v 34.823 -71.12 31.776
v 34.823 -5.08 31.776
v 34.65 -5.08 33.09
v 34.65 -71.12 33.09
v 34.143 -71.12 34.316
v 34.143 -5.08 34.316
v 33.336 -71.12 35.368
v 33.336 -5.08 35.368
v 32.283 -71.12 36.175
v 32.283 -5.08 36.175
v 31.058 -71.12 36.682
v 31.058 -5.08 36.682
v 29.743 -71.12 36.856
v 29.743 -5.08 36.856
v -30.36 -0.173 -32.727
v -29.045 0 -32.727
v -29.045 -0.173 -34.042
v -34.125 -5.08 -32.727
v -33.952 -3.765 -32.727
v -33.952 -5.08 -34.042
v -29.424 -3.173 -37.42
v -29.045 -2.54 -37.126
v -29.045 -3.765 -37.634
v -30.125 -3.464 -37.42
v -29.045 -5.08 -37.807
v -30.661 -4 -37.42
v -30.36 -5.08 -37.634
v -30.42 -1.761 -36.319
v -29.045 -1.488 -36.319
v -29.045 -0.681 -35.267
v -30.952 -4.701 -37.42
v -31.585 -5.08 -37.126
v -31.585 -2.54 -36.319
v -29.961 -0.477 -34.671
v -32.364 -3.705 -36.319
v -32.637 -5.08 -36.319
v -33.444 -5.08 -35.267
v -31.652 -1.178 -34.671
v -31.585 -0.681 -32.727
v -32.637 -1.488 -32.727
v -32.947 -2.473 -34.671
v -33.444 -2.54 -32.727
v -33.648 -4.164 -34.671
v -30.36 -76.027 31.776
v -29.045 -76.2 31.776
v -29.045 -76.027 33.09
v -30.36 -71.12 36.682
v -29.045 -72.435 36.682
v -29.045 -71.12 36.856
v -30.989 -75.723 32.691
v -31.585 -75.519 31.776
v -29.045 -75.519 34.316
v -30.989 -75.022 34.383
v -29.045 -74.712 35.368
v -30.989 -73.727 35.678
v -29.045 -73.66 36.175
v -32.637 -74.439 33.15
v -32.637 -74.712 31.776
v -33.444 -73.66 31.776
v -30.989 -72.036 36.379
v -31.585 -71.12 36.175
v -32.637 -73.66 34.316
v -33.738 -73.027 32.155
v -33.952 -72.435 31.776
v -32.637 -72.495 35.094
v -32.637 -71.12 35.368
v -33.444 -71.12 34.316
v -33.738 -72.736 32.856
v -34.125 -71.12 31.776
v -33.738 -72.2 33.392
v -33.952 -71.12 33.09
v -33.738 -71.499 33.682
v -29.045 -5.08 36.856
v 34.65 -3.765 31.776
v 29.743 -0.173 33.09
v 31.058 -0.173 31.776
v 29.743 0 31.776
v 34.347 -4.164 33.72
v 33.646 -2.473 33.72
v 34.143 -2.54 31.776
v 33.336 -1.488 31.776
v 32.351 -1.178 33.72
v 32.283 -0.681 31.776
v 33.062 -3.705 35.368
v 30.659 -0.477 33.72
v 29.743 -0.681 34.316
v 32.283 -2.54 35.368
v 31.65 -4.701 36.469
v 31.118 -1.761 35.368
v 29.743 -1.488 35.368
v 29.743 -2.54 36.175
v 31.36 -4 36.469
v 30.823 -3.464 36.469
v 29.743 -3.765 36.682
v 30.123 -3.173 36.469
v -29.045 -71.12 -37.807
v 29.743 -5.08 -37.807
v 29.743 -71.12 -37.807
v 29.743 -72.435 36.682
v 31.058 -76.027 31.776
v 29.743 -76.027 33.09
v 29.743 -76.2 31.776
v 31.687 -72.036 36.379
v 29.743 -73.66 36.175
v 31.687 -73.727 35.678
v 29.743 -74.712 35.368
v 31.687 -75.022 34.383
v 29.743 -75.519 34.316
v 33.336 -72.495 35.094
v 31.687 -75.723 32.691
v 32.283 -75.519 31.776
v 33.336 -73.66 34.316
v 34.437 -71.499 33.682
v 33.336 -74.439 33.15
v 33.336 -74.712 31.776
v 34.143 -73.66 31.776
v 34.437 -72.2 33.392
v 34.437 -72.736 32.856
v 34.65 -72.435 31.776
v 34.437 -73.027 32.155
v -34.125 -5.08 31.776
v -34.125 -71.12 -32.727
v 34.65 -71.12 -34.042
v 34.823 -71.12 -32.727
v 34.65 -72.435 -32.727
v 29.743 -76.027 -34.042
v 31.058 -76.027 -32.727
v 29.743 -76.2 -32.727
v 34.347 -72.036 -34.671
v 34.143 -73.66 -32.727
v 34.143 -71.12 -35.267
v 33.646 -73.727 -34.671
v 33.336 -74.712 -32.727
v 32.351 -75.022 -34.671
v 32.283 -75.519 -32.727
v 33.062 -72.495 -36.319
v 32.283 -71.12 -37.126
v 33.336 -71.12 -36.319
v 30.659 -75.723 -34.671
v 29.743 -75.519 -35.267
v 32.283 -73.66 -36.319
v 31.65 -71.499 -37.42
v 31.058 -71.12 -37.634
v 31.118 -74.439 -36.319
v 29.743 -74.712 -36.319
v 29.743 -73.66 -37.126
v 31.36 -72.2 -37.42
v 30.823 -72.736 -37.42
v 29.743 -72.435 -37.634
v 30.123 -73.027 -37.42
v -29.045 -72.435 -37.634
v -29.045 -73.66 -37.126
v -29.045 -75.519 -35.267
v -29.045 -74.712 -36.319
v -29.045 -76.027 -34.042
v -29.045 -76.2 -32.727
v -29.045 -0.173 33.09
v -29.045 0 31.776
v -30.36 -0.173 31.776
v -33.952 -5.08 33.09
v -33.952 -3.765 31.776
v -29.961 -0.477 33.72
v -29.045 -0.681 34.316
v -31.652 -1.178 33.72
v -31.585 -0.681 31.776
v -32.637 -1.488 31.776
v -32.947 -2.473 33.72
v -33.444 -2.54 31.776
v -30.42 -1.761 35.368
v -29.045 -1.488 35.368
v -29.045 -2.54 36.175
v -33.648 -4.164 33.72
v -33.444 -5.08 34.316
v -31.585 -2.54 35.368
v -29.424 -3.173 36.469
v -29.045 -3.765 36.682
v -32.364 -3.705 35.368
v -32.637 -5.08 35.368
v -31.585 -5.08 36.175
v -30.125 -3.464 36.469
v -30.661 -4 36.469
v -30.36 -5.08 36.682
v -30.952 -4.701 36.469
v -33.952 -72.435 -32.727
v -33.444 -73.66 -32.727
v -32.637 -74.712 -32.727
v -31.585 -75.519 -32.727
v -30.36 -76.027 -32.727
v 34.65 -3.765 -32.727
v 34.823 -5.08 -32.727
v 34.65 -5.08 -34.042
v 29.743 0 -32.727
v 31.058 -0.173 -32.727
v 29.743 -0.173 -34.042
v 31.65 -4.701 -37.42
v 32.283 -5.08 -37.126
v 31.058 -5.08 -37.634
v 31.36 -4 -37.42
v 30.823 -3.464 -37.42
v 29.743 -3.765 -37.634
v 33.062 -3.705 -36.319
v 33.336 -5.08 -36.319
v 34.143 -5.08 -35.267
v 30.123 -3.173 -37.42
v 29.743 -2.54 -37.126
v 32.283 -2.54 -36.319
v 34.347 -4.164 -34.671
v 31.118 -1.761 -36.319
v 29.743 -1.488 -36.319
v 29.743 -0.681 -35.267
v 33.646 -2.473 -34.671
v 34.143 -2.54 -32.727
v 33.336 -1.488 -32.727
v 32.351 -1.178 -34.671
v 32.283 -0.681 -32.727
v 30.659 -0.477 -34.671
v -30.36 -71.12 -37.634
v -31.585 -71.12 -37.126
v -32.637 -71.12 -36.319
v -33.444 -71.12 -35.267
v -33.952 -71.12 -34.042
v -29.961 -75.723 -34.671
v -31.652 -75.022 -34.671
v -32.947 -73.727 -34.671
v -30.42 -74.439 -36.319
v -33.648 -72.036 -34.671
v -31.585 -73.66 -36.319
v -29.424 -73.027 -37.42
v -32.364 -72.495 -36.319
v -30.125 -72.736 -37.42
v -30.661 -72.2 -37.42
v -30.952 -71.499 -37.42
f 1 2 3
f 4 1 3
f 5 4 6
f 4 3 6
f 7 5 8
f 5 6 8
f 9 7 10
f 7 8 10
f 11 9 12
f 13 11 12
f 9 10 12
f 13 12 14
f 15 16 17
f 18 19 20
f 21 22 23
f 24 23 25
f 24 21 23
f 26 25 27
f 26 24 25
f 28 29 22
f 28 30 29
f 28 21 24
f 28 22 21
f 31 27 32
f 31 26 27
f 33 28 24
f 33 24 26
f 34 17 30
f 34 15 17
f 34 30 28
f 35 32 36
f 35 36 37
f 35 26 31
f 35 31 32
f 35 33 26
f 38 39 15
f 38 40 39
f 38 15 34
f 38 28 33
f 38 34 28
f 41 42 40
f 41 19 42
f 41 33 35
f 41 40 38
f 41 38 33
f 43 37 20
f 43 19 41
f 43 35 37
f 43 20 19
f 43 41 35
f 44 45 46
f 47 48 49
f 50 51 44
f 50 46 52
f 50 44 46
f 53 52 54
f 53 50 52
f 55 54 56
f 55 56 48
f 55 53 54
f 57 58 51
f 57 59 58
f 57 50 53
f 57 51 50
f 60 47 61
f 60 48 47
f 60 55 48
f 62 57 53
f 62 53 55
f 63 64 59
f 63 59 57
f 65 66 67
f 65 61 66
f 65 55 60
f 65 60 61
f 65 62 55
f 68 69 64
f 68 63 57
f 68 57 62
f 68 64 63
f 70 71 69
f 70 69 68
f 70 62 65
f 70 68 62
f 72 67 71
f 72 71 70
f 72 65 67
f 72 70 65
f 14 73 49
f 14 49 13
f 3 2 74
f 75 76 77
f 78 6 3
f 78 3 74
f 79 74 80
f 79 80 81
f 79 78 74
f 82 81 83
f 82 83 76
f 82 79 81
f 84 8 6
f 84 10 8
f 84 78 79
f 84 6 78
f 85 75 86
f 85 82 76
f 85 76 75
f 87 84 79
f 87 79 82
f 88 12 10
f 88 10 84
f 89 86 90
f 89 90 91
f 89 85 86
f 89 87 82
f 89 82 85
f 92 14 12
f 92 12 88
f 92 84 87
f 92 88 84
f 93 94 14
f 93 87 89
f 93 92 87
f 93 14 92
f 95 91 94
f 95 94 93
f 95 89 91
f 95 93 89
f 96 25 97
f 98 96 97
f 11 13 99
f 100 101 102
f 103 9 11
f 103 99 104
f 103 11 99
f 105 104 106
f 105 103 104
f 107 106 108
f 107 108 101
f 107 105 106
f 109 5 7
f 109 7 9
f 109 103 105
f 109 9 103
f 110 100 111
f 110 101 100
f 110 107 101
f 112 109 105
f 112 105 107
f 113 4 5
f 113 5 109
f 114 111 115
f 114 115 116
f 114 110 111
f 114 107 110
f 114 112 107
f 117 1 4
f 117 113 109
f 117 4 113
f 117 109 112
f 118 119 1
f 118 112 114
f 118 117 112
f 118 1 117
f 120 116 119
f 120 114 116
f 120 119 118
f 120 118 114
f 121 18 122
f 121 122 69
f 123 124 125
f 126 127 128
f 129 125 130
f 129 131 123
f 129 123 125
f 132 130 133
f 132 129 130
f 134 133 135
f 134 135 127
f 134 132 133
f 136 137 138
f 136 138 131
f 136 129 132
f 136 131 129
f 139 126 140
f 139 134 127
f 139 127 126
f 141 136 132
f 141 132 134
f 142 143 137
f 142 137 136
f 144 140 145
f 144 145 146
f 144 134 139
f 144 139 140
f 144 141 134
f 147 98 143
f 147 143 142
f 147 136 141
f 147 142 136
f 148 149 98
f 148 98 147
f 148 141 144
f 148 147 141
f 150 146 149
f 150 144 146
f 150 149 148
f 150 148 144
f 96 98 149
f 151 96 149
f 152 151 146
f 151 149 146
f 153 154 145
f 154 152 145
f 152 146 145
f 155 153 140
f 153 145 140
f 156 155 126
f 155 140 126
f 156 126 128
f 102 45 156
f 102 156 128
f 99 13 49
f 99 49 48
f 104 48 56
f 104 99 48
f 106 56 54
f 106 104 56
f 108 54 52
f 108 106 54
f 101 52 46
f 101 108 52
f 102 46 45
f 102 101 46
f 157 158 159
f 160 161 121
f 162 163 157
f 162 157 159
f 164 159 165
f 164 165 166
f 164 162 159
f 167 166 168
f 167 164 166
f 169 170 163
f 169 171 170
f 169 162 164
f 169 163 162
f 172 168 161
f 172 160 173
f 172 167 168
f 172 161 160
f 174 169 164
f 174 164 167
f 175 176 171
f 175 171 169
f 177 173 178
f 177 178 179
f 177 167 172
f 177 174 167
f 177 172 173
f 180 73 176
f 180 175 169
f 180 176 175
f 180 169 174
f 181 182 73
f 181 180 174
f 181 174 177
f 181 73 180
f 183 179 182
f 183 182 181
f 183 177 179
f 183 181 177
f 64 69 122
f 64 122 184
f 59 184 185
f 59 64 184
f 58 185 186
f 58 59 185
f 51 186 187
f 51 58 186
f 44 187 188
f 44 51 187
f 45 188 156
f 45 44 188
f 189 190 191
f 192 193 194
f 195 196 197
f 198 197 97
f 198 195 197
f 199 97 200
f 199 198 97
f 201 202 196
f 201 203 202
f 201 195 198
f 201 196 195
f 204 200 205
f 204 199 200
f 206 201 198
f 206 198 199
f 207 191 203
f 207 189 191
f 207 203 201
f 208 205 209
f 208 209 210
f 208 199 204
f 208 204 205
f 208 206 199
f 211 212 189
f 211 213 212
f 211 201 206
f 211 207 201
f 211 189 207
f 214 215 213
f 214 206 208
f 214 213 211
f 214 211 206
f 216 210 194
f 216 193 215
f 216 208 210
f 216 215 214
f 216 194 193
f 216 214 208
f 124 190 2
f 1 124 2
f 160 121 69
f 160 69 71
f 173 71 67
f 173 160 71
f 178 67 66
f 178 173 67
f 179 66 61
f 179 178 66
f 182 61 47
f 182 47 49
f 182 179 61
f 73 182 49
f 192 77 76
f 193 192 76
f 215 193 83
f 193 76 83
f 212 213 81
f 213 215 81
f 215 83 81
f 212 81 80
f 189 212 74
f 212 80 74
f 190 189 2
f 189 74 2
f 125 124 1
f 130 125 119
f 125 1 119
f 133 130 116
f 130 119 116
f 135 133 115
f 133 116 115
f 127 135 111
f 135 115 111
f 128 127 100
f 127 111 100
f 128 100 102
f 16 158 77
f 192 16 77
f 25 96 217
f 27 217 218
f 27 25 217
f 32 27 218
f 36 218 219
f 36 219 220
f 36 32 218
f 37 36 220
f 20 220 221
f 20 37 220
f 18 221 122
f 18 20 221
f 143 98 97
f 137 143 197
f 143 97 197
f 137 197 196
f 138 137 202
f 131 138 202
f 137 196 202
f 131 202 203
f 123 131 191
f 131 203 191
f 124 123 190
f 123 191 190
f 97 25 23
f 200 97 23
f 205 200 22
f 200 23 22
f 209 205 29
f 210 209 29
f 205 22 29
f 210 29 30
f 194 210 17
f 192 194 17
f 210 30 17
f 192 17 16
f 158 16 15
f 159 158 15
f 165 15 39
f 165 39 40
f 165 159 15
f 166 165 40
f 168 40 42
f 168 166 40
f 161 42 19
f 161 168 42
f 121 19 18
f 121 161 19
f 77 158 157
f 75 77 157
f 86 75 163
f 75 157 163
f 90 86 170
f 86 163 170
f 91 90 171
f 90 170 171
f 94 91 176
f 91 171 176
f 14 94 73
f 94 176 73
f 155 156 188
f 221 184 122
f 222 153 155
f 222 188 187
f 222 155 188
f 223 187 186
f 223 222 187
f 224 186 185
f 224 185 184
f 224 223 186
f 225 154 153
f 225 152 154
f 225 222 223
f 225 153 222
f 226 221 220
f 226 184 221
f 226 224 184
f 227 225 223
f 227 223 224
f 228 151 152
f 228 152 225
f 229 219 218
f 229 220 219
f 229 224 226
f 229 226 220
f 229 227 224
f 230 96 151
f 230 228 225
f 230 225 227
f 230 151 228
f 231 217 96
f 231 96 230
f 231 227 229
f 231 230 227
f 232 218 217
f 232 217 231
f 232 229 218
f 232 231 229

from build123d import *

# Parameters (mm, degrees)
F0_W         = 68.9483396709
F0_H         = 74.6622905135
F1_DEPTH     = 76.2
F2_R         = 5.08
F3_R         = 5.08
F4_R         = 5.08
F5_T1_DEPTH  = 66.04
F5_T3_DEPTH  = 58.7883396709
F5_S7_W      = 5.08
F5_S7_H      = 5.08
F5_T8_DEPTH  = 5.08
F5_S13_W     = 5.08
F5_S13_H     = 5.08
F5_T14_DEPTH = 5.08
F5_T18_ANGLE = 90
F5_T20_ANGLE = 90
F6_T1_DEPTH  = 58.7883396709
F6_T3_DEPTH  = 66.04
F6_S7_W      = 5.08
F6_S7_H      = 5.08
F6_T8_DEPTH  = 5.08
F6_S13_W     = 5.08
F6_S13_H     = 5.08
F6_T14_DEPTH = 5.08
F6_T18_ANGLE = 90
F6_T20_ANGLE = 90


# Not quite as in the source:
# - a fillet or chamfer that OpenCascade refuses, or shapes differently, is made with other operations: its cross-section is extruded or revolved along the edge and cut away or added


with BuildPart() as f1:
    # F0 (on Front) → F1 (new body)
    with BuildSketch(Plane.XZ):
        with Locations((0.3492366523, -0.4755854607)):
            Rectangle(F0_W, F0_H)
    extrude(amount=F1_DEPTH)

    # F2
    f2_edges = [f1.edges().sort_by_distance(p)[0] for p in [
        (34.823406, -76.2, -0.475585),
        (0.349237, -76.2, 36.85556),
        (-34.124933, -76.2, -0.475585),
        (0.349237, -76.2, -37.806731),
    ]]
    fillet(f2_edges, radius=F2_R)

    # F3
    f3_edges = [f1.edges().sort_by_distance(p)[0] for p in [
        (34.823406, 0, -0.475585),
    ]]
    fillet(f3_edges, radius=F3_R)

    # F4
    f4_edges = [f1.edges().sort_by_distance(p)[0] for p in [
        (-34.124933, 0, -0.475585),
    ]]
    fillet(f4_edges, radius=F4_R)

    # F5: fillet of radius 5.08 on 1 edges, made by hand

    # F5_s2 → F5_t1 (cut)
    with BuildSketch(Plane.XZ.offset(5.08)):
        with BuildLine():
            ThreePointArc((34.8234064877, 31.7755597961), (33.3355089361, 35.3676622445), (29.7434064877, 36.8555597961))
            Line((29.7434064877, 36.8555597961), (34.8234064877, 36.8555597961))
            Line((34.8234064877, 36.8555597961), (34.8234064877, 31.7755597961))
        make_face()
        with BuildLine():
            ThreePointArc((-34.1249331832, 31.7755597961), (-32.6370356316, 35.3676622445), (-29.0449331832, 36.8555597961))
            Line((-29.0449331832, 36.8555597961), (-34.1249331832, 36.8555597961))
            Line((-34.1249331832, 36.8555597961), (-34.1249331832, 31.7755597961))
        make_face()
    extrude(amount=F5_T1_DEPTH, mode=Mode.SUBTRACT)

    # F5_s4 → F5_t3 (cut)
    with BuildSketch(Plane.YZ.offset(-29.0449331832)):
        with BuildLine():
            ThreePointArc((0, 31.7755597961), (-1.4878975516, 35.3676622445), (-5.08, 36.8555597961))
            Line((-5.08, 36.8555597961), (0, 36.8555597961))
            Line((0, 36.8555597961), (0, 31.7755597961))
        make_face()
    extrude(amount=F5_T3_DEPTH, mode=Mode.SUBTRACT)


with BuildPart() as f5_tool6:
    # F5_s7 → F5_t8 (new body)
    with BuildSketch(Plane.YZ.offset(29.7434064877)):
        with Locations((-73.66, 34.3155597961)):
            Rectangle(F5_S7_W, F5_S7_H)
    extrude(amount=F5_T8_DEPTH)

    # F5_s9 → F5_t10 (revolve, cut)
    with BuildSketch(Plane(origin=(29.7434064877, -71.12, 31.7755597961), x_dir=(0, 0.7071067812, -0.7071067812), z_dir=(0, -0.7071067812, -0.7071067812))):
        with BuildLine():
            ThreePointArc((0, -5.08), (5.08, 0), (0, 5.08))
            Line((0, 5.08), (0, -5.08))
        make_face()
    revolve(axis=Axis((29.7434064877, -71.12, 31.7755597961), (1, 0, 0)), mode=Mode.SUBTRACT)


with BuildPart() as f1_1:
    add(f1.part)

    # F5_t5: cut F5_tool6
    add(f5_tool6.part, mode=Mode.SUBTRACT)


with BuildPart() as f5_tool12:
    # F5_s13 → F5_t14 (new body)
    with BuildSketch(Plane.YZ.offset(-29.0449331832)):
        with Locations((-73.66, 34.3155597961)):
            Rectangle(F5_S13_W, F5_S13_H)
    extrude(amount=-F5_T14_DEPTH)

    # F5_s15 → F5_t16 (revolve, cut)
    with BuildSketch(Plane(origin=(-29.0449331832, -71.12, 31.7755597961), x_dir=(0, 0.7071067812, -0.7071067812), z_dir=(0, 0.7071067812, 0.7071067812))):
        with BuildLine():
            ThreePointArc((0, -5.08), (5.08, 0), (0, 5.08))
            Line((0, 5.08), (0, -5.08))
        make_face()
    revolve(axis=Axis((-29.0449331832, -71.12, 31.7755597961), (-1, 0, 0)), mode=Mode.SUBTRACT)


with BuildPart() as f1_2:
    add(f1_1.part)

    # F5_t11: cut F5_tool12
    add(f5_tool12.part, mode=Mode.SUBTRACT)

    # F5_s17 → F5_t18 (revolve, cut)
    with BuildSketch(Plane.XZ.offset(5.08)):
        with BuildLine():
            ThreePointArc((34.8234064877, 31.7755597961), (33.3355089361, 35.3676622445), (29.7434064877, 36.8555597961))
            Line((29.7434064877, 36.8555597961), (34.8234064877, 36.8555597961))
            Line((34.8234064877, 36.8555597961), (34.8234064877, 31.7755597961))
        make_face()
    revolve(axis=Axis((29.7434064877, -5.08, 36.8555597961), (0, 0, 1)), revolution_arc=F5_T18_ANGLE, mode=Mode.SUBTRACT)

    # F5_s19 → F5_t20 (revolve, cut)
    with BuildSketch(Plane.YZ.offset(-29.0449331832)):
        with BuildLine():
            ThreePointArc((0, 31.7755597961), (-1.4878975516, 35.3676622445), (-5.08, 36.8555597961))
            Line((-5.08, 36.8555597961), (0, 36.8555597961))
            Line((0, 36.8555597961), (0, 31.7755597961))
        make_face()
    revolve(axis=Axis((-29.0449331832, -5.08, 36.8555597961), (0, 0, 1)), revolution_arc=F5_T20_ANGLE, mode=Mode.SUBTRACT)

    # F6: fillet of radius 5.08 on 1 edges, made by hand

    # F6_s2 → F6_t1 (cut)
    with BuildSketch(Plane.YZ.offset(-29.0449331832)):
        with BuildLine():
            ThreePointArc((-5.08, -37.8067307174), (-1.4878975516, -36.3188331658), (0, -32.7267307174))
            Line((0, -32.7267307174), (0, -37.8067307174))
            Line((0, -37.8067307174), (-5.08, -37.8067307174))
        make_face()
    extrude(amount=F6_T1_DEPTH, mode=Mode.SUBTRACT)

    # F6_s4 → F6_t3 (cut)
    with BuildSketch(Plane.XZ.offset(5.08)):
        with BuildLine():
            ThreePointArc((29.7434064877, -37.8067307174), (33.3355089361, -36.3188331658), (34.8234064877, -32.7267307174))
            Line((34.8234064877, -32.7267307174), (34.8234064877, -37.8067307174))
            Line((34.8234064877, -37.8067307174), (29.7434064877, -37.8067307174))
        make_face()
        with BuildLine():
            ThreePointArc((-29.0449331832, -37.8067307174), (-32.6370356316, -36.3188331658), (-34.1249331832, -32.7267307174))
            Line((-34.1249331832, -32.7267307174), (-34.1249331832, -37.8067307174))
            Line((-34.1249331832, -37.8067307174), (-29.0449331832, -37.8067307174))
        make_face()
    extrude(amount=F6_T3_DEPTH, mode=Mode.SUBTRACT)


with BuildPart() as f6_tool6:
    # F6_s7 → F6_t8 (new body)
    with BuildSketch(Plane.XY.offset(-32.7267307174)):
        with Locations((32.2834064877, -73.66)):
            Rectangle(F6_S7_W, F6_S7_H)
    extrude(amount=-F6_T8_DEPTH)

    # F6_s9 → F6_t10 (revolve, cut)
    with BuildSketch(Plane(origin=(29.7434064877, -71.12, -32.7267307174), x_dir=(-0.7071067812, 0.7071067812, 0), z_dir=(-0.7071067812, -0.7071067812, 0))):
        with BuildLine():
            ThreePointArc((0, -5.08), (5.08, 0), (0, 5.08))
            Line((0, 5.08), (0, -5.08))
        make_face()
    revolve(axis=Axis((29.7434064877, -71.12, -32.7267307174), (0, 0, -1)), mode=Mode.SUBTRACT)


with BuildPart() as f1_3:
    add(f1_2.part)

    # F6_t5: cut F6_tool6
    add(f6_tool6.part, mode=Mode.SUBTRACT)


with BuildPart() as f6_tool12:
    # F6_s13 → F6_t14 (new body)
    with BuildSketch(Plane.XY.offset(-32.7267307174)):
        with Locations((-31.5849331832, -73.66)):
            Rectangle(F6_S13_W, F6_S13_H)
    extrude(amount=-F6_T14_DEPTH)

    # F6_s15 → F6_t16 (revolve, cut)
    with BuildSketch(Plane(origin=(-29.0449331832, -71.12, -32.7267307174), x_dir=(0.7071067812, 0.7071067812, 0), z_dir=(-0.7071067812, 0.7071067812, 0))):
        with BuildLine():
            ThreePointArc((0, -5.08), (5.08, 0), (0, 5.08))
            Line((0, 5.08), (0, -5.08))
        make_face()
    revolve(axis=Axis((-29.0449331832, -71.12, -32.7267307174), (0, 0, -1)), mode=Mode.SUBTRACT)


with BuildPart() as f1_4:
    add(f1_3.part)

    # F6_t11: cut F6_tool12
    add(f6_tool12.part, mode=Mode.SUBTRACT)

    # F6_s17 → F6_t18 (revolve, cut)
    with BuildSketch(Plane.YZ.offset(-29.0449331832)):
        with BuildLine():
            ThreePointArc((-5.08, -37.8067307174), (-1.4878975516, -36.3188331658), (0, -32.7267307174))
            Line((0, -32.7267307174), (0, -37.8067307174))
            Line((0, -37.8067307174), (-5.08, -37.8067307174))
        make_face()
    revolve(axis=Axis((-29.0449331832, -5.08, -37.8067307174), (0, 0, 1)), revolution_arc=F6_T18_ANGLE, mode=Mode.SUBTRACT)

    # F6_s19 → F6_t20 (revolve, cut)
    with BuildSketch(Plane.XZ.offset(5.08)):
        with BuildLine():
            ThreePointArc((29.7434064877, -37.8067307174), (33.3355089361, -36.3188331658), (34.8234064877, -32.7267307174))
            Line((34.8234064877, -32.7267307174), (34.8234064877, -37.8067307174))
            Line((34.8234064877, -37.8067307174), (29.7434064877, -37.8067307174))
        make_face()
    revolve(axis=Axis((29.7434064877, -5.08, -37.8067307174), (0, 0, 1)), revolution_arc=F6_T20_ANGLE, mode=Mode.SUBTRACT)


solid = f1_4.part
